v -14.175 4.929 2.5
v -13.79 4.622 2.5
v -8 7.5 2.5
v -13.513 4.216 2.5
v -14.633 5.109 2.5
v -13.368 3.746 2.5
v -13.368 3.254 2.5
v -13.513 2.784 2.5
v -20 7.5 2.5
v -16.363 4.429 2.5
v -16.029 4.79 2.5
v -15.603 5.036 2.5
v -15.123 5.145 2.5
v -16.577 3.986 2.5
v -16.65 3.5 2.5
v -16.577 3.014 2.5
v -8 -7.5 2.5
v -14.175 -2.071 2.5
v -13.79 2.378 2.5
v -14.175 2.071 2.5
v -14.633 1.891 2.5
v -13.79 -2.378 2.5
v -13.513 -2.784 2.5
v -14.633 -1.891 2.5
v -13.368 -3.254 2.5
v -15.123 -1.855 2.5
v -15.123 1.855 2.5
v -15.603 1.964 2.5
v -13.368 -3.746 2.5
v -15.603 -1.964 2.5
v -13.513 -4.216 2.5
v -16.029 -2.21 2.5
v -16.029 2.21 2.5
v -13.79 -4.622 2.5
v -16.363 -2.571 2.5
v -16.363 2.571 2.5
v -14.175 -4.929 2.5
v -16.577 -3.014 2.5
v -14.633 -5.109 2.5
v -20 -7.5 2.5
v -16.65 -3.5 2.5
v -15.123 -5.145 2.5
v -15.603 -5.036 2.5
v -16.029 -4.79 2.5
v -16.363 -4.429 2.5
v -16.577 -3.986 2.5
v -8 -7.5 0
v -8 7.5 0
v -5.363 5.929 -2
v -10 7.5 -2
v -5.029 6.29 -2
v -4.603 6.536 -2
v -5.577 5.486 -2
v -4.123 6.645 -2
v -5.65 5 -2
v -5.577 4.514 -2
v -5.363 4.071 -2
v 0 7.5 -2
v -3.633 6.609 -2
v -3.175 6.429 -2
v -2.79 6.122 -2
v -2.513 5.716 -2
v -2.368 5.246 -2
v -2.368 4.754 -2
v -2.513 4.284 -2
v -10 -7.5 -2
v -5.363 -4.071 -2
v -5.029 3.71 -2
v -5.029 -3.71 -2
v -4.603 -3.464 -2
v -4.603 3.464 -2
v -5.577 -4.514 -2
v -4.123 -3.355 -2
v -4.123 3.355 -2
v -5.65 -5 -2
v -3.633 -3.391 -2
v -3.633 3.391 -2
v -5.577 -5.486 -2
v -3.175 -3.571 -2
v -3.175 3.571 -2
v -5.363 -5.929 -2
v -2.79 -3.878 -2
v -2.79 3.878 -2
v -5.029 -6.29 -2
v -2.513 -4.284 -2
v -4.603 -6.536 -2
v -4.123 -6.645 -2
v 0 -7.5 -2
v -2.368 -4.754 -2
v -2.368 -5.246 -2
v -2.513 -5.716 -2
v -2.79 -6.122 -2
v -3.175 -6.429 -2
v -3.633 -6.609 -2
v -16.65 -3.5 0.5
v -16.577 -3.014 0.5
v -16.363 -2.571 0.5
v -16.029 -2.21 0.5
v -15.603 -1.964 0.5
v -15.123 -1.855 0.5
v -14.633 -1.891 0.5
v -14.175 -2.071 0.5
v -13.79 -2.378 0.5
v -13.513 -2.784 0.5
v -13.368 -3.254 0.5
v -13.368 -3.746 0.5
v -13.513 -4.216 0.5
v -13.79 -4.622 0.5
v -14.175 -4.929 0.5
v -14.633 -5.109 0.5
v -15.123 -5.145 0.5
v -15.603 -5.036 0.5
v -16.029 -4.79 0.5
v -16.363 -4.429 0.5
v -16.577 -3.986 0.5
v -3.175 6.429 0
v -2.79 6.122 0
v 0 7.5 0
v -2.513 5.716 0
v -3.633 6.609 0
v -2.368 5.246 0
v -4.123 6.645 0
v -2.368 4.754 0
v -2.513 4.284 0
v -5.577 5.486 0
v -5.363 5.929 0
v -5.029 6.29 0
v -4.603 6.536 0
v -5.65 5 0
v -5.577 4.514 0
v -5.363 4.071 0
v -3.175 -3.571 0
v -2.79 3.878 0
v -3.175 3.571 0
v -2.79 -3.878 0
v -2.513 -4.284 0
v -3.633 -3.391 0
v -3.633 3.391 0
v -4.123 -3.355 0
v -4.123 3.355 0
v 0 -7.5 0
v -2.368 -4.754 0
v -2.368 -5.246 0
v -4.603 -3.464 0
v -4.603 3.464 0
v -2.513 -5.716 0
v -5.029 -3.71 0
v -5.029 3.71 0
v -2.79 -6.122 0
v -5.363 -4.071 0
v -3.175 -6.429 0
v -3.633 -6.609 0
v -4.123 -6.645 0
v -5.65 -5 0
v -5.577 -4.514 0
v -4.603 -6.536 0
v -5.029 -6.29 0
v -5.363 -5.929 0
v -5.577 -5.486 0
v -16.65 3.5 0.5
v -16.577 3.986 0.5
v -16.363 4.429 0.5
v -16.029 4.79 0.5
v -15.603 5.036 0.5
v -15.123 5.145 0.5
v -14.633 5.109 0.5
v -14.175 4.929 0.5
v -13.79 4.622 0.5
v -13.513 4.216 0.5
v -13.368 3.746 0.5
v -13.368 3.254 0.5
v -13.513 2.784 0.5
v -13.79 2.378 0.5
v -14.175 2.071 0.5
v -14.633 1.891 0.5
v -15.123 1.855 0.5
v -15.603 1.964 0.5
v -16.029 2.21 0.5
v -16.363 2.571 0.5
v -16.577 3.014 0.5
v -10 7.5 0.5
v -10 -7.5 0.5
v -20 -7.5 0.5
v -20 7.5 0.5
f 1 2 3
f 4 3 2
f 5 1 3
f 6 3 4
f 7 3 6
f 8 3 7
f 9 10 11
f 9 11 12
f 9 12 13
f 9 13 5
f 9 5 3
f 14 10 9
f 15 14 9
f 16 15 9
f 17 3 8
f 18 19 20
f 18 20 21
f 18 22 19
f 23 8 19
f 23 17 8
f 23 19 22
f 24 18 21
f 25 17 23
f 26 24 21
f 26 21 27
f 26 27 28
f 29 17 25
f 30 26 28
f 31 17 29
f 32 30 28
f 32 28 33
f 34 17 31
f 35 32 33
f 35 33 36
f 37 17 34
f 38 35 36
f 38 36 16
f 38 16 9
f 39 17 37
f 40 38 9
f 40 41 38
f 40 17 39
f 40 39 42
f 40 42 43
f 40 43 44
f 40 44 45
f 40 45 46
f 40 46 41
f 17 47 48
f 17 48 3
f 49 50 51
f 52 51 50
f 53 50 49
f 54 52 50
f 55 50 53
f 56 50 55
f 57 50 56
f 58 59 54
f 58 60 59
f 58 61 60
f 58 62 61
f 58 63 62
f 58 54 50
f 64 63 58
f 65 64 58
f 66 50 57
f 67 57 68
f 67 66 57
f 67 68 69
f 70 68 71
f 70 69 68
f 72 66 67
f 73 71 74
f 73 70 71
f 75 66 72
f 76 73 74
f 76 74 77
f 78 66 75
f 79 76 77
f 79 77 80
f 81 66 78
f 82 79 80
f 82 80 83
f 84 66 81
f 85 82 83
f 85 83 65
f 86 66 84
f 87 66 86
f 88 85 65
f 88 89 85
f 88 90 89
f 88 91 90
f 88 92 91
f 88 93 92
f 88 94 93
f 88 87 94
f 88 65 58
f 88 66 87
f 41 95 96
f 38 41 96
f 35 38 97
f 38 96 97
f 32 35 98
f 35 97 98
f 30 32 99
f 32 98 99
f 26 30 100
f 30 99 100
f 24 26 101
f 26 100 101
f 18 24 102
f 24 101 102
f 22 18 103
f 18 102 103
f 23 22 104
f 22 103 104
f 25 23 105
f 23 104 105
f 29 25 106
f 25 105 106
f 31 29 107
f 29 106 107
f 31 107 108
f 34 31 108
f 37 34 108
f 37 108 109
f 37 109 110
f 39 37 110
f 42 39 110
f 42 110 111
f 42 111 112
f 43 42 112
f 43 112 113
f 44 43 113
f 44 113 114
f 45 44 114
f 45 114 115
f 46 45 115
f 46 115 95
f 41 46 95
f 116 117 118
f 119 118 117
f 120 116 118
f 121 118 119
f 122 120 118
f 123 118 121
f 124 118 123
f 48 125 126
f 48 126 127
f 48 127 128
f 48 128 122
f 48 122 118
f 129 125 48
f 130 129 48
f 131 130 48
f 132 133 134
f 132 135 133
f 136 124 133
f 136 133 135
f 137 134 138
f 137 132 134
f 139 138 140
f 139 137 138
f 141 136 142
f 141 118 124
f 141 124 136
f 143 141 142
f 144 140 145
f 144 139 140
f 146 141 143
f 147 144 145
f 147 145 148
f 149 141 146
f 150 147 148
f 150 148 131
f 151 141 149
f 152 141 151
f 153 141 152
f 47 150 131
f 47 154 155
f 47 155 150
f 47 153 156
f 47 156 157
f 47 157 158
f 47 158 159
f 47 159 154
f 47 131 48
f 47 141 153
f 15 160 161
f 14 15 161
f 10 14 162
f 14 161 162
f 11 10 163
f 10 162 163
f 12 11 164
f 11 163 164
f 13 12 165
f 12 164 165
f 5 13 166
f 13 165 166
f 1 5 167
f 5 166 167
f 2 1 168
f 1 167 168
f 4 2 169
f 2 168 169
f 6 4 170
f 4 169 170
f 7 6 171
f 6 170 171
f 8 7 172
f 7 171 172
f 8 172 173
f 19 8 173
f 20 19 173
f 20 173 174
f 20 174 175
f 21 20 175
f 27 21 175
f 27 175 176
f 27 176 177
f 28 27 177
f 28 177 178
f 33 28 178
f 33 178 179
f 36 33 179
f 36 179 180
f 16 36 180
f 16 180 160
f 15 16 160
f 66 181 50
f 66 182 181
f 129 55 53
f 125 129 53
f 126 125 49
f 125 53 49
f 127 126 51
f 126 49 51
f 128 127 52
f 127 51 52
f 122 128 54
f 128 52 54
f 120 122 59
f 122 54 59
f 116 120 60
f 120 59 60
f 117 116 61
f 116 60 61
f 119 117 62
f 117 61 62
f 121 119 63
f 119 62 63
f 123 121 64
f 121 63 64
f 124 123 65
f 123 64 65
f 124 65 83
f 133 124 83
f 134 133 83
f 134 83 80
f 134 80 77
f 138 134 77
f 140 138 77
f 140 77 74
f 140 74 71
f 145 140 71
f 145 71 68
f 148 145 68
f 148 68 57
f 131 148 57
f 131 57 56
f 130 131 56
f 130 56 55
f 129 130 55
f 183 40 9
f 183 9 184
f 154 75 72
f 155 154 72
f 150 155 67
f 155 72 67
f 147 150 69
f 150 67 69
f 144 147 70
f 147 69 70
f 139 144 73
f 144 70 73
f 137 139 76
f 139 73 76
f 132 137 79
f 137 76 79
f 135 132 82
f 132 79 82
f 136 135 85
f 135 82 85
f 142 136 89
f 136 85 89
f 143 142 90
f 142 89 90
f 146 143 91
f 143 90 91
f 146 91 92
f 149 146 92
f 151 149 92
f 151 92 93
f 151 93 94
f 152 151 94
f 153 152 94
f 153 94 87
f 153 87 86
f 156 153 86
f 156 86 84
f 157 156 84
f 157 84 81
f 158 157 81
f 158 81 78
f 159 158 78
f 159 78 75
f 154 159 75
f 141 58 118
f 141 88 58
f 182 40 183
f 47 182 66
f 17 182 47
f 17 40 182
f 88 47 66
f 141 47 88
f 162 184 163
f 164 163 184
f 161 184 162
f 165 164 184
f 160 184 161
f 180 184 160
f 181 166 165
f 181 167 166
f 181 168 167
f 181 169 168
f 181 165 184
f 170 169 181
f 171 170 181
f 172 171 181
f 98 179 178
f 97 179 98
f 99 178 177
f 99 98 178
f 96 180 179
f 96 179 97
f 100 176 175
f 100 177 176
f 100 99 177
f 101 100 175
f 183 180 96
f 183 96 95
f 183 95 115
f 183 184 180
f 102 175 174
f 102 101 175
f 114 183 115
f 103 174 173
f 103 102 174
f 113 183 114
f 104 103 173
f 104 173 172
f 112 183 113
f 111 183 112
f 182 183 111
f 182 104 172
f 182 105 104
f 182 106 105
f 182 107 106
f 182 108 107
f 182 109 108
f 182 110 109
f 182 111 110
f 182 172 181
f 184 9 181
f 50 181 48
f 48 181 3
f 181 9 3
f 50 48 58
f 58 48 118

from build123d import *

# Parameters (mm, degrees)
F1_DEPTH = 7.5
F3_D     = 3.3
F5_D     = 3.3


with BuildPart() as f1:
    # F0 (on Front) → F1 (new body, symmetric)
    with BuildSketch(Plane.XZ):
        Polygon((0, -2), (0, 0), (-8, 0), (-8, 2.5), (-20, 2.5), (-20, 0.5), (-10, 0.5), (-10, -2), align=None)
    extrude(amount=F1_DEPTH, both=True)

    # F3 (through all)
    with Locations(Plane.XY.offset(2.5)):
        with Locations((-15, -3.5), (-15, 3.5)):
            Hole(F3_D / 2)

    # F5 (through all)
    with Locations(Plane.XY):
        with Locations((-4, -5), (-4, 5)):
            Hole(F5_D / 2)


solid = f1.part
